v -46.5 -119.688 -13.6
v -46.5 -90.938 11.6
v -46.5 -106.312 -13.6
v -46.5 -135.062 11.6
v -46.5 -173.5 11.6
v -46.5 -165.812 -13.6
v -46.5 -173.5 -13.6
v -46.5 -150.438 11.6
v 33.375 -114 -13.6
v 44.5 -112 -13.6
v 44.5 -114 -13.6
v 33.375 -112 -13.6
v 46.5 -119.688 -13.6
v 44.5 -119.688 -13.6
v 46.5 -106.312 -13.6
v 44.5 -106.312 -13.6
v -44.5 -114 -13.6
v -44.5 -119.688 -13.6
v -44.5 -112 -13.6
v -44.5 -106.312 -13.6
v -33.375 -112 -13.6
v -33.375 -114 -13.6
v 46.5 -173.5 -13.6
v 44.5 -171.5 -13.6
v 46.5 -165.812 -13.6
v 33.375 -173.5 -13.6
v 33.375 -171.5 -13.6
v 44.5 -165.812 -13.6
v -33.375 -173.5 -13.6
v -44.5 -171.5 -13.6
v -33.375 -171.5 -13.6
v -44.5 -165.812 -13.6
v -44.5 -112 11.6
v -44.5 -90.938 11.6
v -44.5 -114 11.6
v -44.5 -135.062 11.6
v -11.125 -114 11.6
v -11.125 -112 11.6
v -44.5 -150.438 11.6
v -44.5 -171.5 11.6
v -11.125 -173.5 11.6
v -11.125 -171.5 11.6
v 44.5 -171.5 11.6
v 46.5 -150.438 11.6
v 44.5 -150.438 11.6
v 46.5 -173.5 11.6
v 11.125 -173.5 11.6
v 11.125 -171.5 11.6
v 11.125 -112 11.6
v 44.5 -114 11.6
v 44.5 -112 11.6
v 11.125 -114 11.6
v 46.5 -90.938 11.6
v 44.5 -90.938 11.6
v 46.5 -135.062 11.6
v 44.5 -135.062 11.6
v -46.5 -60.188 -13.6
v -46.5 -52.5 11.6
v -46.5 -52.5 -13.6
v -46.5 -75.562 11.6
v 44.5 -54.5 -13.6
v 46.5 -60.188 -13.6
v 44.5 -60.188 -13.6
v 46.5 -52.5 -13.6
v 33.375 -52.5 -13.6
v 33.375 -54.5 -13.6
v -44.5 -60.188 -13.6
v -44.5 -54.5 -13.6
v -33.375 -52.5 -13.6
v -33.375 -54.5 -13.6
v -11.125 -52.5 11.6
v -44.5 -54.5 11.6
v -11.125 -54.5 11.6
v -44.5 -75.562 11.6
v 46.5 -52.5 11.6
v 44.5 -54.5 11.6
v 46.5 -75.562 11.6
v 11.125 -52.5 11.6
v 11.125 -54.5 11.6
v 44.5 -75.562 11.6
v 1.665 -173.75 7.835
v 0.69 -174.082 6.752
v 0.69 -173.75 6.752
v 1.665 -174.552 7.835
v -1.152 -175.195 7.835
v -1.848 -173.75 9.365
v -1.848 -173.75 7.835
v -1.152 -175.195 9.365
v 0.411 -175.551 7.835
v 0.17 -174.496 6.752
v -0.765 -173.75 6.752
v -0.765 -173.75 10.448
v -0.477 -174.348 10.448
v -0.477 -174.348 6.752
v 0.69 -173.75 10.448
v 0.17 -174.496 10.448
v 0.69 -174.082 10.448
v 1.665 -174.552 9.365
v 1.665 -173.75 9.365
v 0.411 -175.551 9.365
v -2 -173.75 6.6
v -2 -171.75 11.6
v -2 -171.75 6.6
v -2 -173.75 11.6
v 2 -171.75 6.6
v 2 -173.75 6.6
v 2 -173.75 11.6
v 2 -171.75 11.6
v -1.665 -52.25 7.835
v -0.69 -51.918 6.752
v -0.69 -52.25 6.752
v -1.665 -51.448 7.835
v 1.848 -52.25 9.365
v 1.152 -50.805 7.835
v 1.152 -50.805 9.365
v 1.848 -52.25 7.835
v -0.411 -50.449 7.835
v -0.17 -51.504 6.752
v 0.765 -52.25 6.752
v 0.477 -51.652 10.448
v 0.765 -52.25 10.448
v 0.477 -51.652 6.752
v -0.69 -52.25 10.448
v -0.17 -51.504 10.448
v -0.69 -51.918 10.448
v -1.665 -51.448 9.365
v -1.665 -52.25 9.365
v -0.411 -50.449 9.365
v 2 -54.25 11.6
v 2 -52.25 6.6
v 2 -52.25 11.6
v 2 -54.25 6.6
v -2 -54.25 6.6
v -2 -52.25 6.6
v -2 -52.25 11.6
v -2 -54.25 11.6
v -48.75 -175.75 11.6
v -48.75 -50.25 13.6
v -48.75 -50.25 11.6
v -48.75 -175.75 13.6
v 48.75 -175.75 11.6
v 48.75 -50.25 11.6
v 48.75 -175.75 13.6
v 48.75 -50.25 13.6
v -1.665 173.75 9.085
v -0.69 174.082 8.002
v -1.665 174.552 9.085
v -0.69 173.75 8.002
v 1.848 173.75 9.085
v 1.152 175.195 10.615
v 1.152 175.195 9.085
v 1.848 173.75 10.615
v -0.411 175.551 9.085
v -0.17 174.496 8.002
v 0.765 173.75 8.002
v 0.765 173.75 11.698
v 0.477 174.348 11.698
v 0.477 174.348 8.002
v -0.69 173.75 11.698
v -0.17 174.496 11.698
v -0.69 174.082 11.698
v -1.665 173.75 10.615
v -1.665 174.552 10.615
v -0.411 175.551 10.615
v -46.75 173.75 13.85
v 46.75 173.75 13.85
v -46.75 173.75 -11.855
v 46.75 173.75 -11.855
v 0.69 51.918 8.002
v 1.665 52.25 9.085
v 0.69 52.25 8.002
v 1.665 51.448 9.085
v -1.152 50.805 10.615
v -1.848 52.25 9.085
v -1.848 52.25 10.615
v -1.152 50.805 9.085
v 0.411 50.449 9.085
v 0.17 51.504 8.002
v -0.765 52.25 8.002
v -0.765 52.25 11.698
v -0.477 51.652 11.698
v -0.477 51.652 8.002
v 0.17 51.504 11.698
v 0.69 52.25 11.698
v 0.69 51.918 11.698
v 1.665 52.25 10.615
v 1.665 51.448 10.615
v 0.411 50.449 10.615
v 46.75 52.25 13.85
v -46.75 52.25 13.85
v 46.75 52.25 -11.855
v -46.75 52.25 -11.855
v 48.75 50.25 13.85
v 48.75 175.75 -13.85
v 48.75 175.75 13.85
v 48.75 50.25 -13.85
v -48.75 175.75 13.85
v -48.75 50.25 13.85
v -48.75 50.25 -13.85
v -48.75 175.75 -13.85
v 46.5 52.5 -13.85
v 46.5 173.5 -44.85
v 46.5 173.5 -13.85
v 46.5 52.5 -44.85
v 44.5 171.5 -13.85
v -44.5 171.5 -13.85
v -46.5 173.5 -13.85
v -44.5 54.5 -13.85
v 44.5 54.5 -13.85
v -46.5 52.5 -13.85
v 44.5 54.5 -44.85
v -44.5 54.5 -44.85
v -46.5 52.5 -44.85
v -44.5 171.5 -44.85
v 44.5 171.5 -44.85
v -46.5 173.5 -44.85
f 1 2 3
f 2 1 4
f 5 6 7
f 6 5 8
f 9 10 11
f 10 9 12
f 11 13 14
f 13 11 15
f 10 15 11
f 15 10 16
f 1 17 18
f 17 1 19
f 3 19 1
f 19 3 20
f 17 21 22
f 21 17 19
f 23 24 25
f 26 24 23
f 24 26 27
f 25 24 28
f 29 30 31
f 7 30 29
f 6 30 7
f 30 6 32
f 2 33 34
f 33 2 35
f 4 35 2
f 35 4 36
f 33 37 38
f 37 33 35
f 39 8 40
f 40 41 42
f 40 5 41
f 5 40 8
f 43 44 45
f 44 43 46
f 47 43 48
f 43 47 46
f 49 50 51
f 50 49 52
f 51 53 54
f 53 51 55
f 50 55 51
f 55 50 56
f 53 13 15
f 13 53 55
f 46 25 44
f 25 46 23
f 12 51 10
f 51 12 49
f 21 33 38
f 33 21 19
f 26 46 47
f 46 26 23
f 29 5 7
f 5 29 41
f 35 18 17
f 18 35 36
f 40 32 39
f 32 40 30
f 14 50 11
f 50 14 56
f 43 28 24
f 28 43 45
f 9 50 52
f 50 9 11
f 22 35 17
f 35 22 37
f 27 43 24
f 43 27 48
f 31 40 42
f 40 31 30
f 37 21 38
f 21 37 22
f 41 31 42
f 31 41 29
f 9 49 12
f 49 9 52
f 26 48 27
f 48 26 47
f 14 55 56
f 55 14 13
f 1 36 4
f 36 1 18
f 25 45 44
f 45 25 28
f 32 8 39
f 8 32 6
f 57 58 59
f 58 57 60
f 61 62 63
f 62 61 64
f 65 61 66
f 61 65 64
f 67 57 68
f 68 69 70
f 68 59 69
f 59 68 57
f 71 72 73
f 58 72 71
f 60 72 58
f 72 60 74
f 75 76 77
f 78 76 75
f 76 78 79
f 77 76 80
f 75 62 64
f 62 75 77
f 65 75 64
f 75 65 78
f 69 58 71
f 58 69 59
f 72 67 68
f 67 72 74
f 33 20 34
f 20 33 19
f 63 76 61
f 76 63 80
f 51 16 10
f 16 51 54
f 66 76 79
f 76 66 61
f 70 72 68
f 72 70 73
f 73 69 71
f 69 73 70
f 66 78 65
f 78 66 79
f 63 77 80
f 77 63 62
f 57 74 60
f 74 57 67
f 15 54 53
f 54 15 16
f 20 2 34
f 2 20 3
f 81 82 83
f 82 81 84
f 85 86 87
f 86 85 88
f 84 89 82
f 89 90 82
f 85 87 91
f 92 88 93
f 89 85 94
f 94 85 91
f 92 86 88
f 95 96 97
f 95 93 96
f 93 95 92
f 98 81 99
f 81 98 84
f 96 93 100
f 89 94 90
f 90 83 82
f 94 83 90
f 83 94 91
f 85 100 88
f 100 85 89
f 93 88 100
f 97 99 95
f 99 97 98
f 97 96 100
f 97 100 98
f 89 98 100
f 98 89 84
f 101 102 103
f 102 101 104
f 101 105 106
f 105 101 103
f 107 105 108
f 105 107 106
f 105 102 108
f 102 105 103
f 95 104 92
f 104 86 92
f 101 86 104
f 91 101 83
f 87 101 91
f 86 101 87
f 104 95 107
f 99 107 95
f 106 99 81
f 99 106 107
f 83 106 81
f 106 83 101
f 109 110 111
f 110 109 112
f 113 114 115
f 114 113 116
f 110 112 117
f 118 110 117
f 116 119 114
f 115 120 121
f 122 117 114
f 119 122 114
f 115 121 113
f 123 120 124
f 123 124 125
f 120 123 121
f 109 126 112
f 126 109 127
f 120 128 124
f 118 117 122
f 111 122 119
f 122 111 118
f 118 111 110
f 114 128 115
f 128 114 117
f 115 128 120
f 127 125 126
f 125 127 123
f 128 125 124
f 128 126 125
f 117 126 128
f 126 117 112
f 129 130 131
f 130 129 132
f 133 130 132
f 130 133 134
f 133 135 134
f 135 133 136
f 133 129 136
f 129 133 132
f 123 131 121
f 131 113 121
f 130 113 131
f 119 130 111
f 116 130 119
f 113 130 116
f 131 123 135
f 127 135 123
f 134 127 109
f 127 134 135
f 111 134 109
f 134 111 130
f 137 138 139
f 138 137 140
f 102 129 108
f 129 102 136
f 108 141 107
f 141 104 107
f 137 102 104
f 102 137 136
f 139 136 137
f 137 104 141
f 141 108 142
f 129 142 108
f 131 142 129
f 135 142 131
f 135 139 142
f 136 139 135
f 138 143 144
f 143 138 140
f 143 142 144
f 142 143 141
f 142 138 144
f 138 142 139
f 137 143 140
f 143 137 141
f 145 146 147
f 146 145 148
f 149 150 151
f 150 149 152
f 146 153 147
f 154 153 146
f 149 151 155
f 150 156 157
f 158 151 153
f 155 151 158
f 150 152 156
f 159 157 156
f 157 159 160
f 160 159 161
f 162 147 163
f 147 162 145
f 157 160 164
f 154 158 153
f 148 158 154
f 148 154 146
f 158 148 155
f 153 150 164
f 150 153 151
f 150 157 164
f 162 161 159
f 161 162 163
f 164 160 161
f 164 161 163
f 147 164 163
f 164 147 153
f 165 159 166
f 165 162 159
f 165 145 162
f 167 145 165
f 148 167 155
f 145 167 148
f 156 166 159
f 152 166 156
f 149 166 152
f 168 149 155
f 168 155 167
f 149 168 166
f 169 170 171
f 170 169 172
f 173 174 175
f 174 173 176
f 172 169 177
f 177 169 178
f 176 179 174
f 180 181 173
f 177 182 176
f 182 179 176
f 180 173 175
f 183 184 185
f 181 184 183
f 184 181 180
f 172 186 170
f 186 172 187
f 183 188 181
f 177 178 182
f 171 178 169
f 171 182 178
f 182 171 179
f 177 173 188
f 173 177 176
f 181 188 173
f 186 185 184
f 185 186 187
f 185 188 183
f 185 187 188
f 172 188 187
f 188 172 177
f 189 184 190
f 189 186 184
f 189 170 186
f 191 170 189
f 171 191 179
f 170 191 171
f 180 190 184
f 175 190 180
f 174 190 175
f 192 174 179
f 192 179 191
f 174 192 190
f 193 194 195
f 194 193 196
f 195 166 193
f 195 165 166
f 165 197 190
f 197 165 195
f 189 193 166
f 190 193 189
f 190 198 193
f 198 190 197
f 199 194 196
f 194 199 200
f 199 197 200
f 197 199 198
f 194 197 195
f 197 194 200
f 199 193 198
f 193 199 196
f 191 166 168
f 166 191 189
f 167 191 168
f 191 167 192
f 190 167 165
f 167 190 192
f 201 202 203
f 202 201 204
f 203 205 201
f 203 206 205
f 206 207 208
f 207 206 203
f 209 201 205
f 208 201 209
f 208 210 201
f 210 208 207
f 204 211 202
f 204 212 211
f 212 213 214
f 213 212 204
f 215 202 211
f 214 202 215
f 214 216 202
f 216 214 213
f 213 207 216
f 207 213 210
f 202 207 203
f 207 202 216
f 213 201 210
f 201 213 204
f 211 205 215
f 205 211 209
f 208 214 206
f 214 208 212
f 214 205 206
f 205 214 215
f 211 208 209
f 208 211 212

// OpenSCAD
longueur_carte = 88;
largeur_carte = 56.5;
epaisseur_carte = 0.3;
nb_cartes = 84;
hauteur_cartes = epaisseur_carte*nb_cartes;
epaisseur = 2;
marge = 0.5;
manifold = 0.01;
hauteur_buzzer = 31;
largeur_plaque = 2*largeur_carte+5*marge+5*epaisseur;
longueur_plaque = longueur_carte+3*marge+4*epaisseur;
	
module bloc_carte(longueur_carte, largeur_carte, hauteur_bloc, epaisseur){
	difference(){
		cube([longueur_carte+2*epaisseur, largeur_carte+2*epaisseur, hauteur_bloc], center=true);
		cube([longueur_carte, largeur_carte, 2*hauteur_bloc], center=true);
		triangle_decoupe(largeur_carte+3*epaisseur, longueur_carte, 2*hauteur_bloc);
		rotate([0,0,90]) triangle_decoupe(longueur_carte+3*epaisseur, largeur_carte+2*epaisseur, 2*hauteur_bloc);
	}
}

module triangle_decoupe(longueur, largeur, hauteur){
	translate([-largeur/2,0,hauteur/2])rotate([-90,0,0]) linear_extrude(height=longueur, center=true) polygon(points=[[0,0],[largeur,0],[largeur/2,hauteur]], paths=[[0,1,2]]);
}

module bloc_verrou(largeur_plaque, epaisseur){
	translate([0,-largeur_plaque/2+epaisseur,0]) verrou(epaisseur);
	translate([0,largeur_plaque/2-epaisseur,0]) rotate([0,0,180])verrou(epaisseur);
}

module verrou(epaisseur){
	translate([0,0, 2*epaisseur]) sphere(r = epaisseur);
	translate([0,epaisseur/2, 3*epaisseur/2]) cube([2*epaisseur, epaisseur, 3*epaisseur], center=true);
}

module base(){
	cube([longueur_plaque, largeur_plaque, epaisseur], center=true);
	translate([0,-(largeur_carte+2*marge+2*epaisseur)/2+epaisseur/2,(hauteur_cartes+epaisseur)/2]) bloc_carte(longueur_carte+2*marge, largeur_carte+2*marge, hauteur_cartes, epaisseur);	
	translate([0,(largeur_carte+2*marge+2*epaisseur)/2-epaisseur/2,(hauteur_cartes+epaisseur)/2]) bloc_carte(longueur_carte+2*marge, largeur_carte+2*marge, hauteur_cartes, epaisseur);	
	bloc_verrou(largeur_plaque, epaisseur);
}


module couvercle_1(){
	hauteur_couvercle = hauteur_cartes+epaisseur+marge;
	difference(){
		cube([longueur_plaque, largeur_plaque, hauteur_couvercle], center=true);
		translate([0,0,epaisseur/2]) cube([longueur_plaque-2*epaisseur, largeur_plaque-2*epaisseur, hauteur_cartes+manifold+marge], center=true);
		translate([0,0,hauteur_couvercle/2]) rotate([180,0,0]) bloc_verrou(largeur_plaque, epaisseur);
	}
	translate([0,0,-(hauteur_couvercle+hauteur_buzzer)/2]) 
	difference(){
		cube([longueur_plaque-2*epaisseur-marge, largeur_plaque-2*epaisseur-marge, hauteur_buzzer], center=true);
		cube([longueur_plaque-4*epaisseur-marge, largeur_plaque-4*epaisseur-marge, hauteur_buzzer+manifold+marge], center=true);
	}
}

module couvercle_2(){
	difference(){
		cube([longueur_plaque, largeur_plaque, hauteur_buzzer+epaisseur+marge], center=true);
		translate([0,0,epaisseur/2]) cube([longueur_plaque-2*epaisseur, largeur_plaque-2*epaisseur, hauteur_cartes+manifold+marge], center=true);
	}
}



translate([0,0,hauteur_cartes/2]) rotate([0, 180, 0]) translate([0,-2*largeur_carte,0]) color("blue") base();
translate([0,+2*largeur_carte,0]) couvercle_1();
